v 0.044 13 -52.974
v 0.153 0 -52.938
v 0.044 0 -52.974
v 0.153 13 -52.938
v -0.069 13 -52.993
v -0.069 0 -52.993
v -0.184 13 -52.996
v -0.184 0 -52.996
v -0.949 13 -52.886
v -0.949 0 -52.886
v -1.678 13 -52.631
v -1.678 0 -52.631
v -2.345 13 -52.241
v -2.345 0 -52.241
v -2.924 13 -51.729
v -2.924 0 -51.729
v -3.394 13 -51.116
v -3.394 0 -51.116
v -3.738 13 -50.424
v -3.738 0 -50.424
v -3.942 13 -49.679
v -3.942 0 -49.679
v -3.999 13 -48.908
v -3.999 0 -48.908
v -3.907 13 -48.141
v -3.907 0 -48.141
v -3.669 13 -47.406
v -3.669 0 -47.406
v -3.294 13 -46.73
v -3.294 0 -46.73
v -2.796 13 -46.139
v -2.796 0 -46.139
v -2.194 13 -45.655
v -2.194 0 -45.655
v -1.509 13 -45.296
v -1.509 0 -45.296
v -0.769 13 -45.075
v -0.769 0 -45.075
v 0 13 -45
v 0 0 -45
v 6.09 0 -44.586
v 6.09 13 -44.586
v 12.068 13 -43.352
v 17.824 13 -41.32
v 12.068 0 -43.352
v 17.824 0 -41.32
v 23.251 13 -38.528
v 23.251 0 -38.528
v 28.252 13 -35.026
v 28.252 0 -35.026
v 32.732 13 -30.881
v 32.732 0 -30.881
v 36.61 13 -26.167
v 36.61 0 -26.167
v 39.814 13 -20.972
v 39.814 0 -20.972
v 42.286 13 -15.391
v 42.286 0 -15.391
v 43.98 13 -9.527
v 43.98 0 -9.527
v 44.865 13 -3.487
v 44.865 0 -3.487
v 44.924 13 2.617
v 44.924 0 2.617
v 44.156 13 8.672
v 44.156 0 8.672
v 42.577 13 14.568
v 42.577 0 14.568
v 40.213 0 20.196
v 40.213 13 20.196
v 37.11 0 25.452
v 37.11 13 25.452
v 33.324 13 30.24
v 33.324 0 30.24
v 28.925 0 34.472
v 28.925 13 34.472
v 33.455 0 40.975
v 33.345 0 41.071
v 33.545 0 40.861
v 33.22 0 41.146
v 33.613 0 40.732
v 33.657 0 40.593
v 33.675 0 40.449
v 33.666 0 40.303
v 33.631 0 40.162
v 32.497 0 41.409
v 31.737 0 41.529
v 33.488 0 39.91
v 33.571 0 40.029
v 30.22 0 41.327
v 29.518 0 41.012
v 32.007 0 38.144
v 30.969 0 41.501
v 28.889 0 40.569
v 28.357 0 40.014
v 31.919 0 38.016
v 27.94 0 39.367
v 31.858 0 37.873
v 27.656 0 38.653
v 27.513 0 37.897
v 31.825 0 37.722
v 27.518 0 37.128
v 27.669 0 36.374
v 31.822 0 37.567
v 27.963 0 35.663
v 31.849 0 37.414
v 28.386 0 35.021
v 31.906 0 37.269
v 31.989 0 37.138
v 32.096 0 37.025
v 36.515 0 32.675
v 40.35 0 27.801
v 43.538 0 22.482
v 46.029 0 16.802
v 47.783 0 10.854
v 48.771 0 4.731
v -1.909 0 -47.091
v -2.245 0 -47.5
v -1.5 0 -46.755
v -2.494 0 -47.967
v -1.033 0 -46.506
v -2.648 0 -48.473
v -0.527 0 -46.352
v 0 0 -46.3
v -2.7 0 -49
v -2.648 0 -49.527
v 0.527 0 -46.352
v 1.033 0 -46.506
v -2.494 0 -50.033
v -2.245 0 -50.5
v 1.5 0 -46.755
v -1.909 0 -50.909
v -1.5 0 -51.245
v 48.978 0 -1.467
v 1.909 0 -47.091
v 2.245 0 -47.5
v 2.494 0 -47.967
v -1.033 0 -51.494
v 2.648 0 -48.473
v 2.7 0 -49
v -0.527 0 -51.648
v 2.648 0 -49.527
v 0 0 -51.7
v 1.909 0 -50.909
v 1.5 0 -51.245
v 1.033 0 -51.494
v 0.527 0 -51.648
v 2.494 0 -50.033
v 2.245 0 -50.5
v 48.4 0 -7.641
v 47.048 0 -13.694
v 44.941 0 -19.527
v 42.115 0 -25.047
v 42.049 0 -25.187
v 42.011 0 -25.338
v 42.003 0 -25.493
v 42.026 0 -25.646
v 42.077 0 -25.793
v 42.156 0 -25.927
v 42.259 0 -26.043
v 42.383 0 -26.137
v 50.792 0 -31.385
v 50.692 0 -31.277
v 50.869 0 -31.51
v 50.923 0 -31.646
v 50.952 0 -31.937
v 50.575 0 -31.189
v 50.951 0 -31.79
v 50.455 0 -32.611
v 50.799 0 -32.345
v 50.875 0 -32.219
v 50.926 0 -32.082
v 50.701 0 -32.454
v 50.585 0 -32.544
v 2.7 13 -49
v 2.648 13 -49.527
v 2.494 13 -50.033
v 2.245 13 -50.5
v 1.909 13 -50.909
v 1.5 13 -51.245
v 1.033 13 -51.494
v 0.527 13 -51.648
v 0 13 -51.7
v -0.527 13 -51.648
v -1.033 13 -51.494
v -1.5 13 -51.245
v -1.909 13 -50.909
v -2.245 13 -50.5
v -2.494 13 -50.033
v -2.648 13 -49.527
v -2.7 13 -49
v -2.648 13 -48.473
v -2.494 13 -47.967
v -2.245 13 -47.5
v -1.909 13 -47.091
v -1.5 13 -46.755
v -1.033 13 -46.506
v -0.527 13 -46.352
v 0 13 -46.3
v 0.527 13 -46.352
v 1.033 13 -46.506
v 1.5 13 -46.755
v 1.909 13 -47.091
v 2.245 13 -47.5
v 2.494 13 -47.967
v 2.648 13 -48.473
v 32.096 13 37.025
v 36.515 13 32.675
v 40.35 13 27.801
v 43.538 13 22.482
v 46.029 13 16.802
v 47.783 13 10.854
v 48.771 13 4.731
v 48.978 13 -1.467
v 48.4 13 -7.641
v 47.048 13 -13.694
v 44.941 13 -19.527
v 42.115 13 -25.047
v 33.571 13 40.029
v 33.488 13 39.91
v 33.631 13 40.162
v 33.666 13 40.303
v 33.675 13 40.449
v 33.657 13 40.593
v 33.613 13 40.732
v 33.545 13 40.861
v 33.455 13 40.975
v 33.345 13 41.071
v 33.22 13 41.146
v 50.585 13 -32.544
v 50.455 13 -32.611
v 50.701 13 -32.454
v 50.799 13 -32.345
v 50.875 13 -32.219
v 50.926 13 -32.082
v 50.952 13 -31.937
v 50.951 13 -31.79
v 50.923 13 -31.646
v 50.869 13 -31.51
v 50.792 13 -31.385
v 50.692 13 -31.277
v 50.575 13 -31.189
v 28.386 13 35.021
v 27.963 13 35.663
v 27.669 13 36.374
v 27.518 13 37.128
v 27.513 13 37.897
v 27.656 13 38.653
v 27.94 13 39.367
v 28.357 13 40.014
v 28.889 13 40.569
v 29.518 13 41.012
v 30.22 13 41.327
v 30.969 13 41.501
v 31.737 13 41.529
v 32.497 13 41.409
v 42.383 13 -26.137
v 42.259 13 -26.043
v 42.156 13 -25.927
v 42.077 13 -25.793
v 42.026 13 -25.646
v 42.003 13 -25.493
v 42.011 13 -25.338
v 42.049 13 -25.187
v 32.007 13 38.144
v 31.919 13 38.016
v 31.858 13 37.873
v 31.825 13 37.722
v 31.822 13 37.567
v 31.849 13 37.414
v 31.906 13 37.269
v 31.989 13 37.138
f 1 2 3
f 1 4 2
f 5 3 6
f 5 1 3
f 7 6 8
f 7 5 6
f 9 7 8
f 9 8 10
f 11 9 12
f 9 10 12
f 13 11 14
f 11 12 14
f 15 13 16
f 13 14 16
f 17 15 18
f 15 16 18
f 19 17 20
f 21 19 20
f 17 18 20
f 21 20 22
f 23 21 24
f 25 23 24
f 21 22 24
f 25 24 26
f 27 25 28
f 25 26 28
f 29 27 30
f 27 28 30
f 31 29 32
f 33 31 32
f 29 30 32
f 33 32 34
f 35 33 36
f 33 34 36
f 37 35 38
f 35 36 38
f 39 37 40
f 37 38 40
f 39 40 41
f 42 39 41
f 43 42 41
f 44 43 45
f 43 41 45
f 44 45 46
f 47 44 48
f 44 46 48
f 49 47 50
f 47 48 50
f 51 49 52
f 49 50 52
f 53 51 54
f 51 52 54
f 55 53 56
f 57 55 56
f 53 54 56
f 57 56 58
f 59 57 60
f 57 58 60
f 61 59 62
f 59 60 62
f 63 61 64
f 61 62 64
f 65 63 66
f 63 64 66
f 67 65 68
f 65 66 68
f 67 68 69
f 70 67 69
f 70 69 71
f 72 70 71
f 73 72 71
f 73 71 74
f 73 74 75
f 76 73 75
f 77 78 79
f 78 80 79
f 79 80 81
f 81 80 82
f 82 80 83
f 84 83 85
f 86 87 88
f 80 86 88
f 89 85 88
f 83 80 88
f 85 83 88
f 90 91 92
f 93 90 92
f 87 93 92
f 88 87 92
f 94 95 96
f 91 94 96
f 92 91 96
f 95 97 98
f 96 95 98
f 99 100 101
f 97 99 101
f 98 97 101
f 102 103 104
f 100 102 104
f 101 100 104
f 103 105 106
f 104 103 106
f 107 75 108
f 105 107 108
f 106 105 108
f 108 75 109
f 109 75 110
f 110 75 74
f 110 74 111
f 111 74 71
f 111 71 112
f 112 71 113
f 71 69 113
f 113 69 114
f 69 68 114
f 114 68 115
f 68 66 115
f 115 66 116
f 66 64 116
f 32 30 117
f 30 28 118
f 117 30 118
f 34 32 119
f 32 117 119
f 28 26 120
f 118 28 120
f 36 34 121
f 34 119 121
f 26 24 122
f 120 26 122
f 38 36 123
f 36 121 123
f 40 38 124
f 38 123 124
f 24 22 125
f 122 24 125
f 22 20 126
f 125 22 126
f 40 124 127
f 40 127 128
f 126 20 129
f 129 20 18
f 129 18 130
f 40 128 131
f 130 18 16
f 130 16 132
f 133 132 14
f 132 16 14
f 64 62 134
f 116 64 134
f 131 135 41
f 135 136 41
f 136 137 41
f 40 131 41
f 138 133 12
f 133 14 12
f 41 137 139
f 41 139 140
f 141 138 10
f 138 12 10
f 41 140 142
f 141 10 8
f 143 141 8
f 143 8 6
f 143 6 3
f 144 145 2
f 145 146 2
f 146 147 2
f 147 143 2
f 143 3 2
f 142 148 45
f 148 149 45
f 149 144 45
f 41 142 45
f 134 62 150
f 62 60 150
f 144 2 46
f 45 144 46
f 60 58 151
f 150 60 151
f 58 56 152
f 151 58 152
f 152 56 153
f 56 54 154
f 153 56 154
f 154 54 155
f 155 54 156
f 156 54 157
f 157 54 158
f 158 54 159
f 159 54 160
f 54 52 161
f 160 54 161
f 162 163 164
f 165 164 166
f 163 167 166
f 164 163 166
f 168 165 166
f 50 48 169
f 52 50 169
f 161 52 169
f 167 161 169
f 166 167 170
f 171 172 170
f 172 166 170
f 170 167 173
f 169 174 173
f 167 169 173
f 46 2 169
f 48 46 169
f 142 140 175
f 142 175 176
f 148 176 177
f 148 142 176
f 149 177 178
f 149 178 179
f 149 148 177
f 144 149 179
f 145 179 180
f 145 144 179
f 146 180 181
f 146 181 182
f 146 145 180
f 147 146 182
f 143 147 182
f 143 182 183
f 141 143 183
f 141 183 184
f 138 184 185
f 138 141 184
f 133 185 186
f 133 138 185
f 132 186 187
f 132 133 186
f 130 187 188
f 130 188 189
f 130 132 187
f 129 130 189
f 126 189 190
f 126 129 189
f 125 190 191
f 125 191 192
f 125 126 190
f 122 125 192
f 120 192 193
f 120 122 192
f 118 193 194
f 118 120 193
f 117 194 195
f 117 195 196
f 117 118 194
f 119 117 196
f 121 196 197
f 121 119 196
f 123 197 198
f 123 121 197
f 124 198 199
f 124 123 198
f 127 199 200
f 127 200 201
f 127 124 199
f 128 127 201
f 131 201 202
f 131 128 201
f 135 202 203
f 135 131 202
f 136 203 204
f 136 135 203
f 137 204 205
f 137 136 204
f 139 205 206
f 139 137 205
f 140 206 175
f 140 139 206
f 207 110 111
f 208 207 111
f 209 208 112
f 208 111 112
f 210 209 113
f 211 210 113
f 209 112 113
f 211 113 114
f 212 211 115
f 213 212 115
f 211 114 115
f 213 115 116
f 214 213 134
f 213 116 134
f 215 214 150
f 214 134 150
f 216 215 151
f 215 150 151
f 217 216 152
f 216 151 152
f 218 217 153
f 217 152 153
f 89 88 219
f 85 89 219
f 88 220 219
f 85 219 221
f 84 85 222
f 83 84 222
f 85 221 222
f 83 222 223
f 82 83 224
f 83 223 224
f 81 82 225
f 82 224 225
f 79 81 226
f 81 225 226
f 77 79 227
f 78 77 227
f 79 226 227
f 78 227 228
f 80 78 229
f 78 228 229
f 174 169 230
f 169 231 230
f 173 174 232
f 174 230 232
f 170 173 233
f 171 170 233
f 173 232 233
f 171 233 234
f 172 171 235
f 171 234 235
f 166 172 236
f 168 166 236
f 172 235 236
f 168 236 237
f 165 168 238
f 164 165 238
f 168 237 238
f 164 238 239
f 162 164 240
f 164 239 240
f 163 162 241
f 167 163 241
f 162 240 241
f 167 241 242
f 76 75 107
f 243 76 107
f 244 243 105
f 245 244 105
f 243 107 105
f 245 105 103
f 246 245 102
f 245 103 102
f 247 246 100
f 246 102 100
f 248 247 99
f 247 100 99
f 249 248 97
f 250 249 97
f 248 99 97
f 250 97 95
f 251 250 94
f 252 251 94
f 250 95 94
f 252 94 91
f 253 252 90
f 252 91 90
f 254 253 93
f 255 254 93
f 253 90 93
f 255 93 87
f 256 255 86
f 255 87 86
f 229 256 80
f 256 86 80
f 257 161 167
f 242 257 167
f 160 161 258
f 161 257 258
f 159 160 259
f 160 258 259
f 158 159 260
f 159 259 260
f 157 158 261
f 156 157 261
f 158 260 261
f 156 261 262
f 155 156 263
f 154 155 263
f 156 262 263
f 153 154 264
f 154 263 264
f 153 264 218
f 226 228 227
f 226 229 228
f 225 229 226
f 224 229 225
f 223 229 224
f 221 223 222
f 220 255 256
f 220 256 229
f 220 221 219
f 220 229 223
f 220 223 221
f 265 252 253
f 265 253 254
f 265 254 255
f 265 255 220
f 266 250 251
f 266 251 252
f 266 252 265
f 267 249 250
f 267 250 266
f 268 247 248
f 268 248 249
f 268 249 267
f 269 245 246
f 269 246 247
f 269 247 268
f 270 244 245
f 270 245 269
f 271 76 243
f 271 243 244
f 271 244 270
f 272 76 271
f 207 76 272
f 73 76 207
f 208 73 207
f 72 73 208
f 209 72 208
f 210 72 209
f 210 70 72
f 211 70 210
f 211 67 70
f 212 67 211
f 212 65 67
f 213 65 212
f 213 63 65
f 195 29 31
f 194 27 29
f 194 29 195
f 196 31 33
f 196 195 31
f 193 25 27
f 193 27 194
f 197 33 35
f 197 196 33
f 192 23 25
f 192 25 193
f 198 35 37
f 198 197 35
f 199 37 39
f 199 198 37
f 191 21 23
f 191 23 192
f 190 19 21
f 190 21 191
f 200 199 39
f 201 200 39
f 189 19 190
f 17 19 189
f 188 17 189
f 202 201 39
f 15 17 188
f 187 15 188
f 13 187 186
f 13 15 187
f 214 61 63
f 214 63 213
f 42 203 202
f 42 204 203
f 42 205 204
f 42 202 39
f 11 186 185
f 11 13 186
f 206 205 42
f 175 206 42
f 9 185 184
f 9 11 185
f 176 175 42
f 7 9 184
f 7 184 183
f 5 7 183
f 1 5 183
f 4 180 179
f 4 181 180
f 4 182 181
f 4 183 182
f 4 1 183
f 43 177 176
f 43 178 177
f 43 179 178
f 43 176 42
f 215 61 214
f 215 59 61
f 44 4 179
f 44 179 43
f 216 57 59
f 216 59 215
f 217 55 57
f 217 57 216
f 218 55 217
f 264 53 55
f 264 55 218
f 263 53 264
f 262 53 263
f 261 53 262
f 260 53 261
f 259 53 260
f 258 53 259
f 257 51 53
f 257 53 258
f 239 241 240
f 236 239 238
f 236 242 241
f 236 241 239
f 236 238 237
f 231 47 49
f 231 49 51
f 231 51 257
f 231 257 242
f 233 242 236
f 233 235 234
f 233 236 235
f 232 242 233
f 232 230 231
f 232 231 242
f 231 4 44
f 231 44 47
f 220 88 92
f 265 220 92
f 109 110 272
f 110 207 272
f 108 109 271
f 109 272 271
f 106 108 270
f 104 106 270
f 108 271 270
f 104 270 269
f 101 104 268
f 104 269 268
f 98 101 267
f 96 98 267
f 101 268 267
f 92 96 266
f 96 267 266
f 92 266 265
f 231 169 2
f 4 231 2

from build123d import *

# Parameters (mm, degrees)
SKETCH1_R           = 2.7
BOSS_EXTRUDE1_DEPTH = 13
FILLET1_R           = 0.8


with BuildPart() as part:
    # Sketch1 → Boss-Extrude1 (new body)
    with BuildSketch(Plane(origin=(0, 0, 0), x_dir=(1, 0, 0), z_dir=(0, 1, 0))):
        with BuildLine():
            Line((51.921017872, 32.018867925), (0, 53))
            ThreePointArc((0, 53), (-4, 49), (0, 45))
            ThreePointArc((0, 45), (42.286167935, 15.39090645), (28.925442436, -34.47199994))
            ThreePointArc((28.925442436, -34.47199994), (28.432415102, -40.107328152), (34.067743313, -40.600355485))
            Line((34.067743313, -40.600355485), (31.496592875, -37.536177713))
            ThreePointArc((31.496592875, -37.536177713), (48.373872913, -7.808227676), (41.707047143, 25.720074234))
            Line((41.707047143, 25.720074234), (51.921017872, 32.018867925))
        make_face()
        with Locations((0, 49)):
            Circle(SKETCH1_R, mode=Mode.SUBTRACT)
    extrude(amount=BOSS_EXTRUDE1_DEPTH)

    # Fillet1
    fillet1_edges = [part.edges().sort_by_distance(p)[0] for p in [
        (51.921017872, 6.5, -32.018867925),
        (41.707047143, 6.5, -25.720074234),
        (31.496592875, 6.5, 37.536177713),
        (34.067743313, 6.5, 40.600355485),
        (0, 6.5, -53),
    ]]
    fillet(fillet1_edges, radius=FILLET1_R)


solid = part.part
